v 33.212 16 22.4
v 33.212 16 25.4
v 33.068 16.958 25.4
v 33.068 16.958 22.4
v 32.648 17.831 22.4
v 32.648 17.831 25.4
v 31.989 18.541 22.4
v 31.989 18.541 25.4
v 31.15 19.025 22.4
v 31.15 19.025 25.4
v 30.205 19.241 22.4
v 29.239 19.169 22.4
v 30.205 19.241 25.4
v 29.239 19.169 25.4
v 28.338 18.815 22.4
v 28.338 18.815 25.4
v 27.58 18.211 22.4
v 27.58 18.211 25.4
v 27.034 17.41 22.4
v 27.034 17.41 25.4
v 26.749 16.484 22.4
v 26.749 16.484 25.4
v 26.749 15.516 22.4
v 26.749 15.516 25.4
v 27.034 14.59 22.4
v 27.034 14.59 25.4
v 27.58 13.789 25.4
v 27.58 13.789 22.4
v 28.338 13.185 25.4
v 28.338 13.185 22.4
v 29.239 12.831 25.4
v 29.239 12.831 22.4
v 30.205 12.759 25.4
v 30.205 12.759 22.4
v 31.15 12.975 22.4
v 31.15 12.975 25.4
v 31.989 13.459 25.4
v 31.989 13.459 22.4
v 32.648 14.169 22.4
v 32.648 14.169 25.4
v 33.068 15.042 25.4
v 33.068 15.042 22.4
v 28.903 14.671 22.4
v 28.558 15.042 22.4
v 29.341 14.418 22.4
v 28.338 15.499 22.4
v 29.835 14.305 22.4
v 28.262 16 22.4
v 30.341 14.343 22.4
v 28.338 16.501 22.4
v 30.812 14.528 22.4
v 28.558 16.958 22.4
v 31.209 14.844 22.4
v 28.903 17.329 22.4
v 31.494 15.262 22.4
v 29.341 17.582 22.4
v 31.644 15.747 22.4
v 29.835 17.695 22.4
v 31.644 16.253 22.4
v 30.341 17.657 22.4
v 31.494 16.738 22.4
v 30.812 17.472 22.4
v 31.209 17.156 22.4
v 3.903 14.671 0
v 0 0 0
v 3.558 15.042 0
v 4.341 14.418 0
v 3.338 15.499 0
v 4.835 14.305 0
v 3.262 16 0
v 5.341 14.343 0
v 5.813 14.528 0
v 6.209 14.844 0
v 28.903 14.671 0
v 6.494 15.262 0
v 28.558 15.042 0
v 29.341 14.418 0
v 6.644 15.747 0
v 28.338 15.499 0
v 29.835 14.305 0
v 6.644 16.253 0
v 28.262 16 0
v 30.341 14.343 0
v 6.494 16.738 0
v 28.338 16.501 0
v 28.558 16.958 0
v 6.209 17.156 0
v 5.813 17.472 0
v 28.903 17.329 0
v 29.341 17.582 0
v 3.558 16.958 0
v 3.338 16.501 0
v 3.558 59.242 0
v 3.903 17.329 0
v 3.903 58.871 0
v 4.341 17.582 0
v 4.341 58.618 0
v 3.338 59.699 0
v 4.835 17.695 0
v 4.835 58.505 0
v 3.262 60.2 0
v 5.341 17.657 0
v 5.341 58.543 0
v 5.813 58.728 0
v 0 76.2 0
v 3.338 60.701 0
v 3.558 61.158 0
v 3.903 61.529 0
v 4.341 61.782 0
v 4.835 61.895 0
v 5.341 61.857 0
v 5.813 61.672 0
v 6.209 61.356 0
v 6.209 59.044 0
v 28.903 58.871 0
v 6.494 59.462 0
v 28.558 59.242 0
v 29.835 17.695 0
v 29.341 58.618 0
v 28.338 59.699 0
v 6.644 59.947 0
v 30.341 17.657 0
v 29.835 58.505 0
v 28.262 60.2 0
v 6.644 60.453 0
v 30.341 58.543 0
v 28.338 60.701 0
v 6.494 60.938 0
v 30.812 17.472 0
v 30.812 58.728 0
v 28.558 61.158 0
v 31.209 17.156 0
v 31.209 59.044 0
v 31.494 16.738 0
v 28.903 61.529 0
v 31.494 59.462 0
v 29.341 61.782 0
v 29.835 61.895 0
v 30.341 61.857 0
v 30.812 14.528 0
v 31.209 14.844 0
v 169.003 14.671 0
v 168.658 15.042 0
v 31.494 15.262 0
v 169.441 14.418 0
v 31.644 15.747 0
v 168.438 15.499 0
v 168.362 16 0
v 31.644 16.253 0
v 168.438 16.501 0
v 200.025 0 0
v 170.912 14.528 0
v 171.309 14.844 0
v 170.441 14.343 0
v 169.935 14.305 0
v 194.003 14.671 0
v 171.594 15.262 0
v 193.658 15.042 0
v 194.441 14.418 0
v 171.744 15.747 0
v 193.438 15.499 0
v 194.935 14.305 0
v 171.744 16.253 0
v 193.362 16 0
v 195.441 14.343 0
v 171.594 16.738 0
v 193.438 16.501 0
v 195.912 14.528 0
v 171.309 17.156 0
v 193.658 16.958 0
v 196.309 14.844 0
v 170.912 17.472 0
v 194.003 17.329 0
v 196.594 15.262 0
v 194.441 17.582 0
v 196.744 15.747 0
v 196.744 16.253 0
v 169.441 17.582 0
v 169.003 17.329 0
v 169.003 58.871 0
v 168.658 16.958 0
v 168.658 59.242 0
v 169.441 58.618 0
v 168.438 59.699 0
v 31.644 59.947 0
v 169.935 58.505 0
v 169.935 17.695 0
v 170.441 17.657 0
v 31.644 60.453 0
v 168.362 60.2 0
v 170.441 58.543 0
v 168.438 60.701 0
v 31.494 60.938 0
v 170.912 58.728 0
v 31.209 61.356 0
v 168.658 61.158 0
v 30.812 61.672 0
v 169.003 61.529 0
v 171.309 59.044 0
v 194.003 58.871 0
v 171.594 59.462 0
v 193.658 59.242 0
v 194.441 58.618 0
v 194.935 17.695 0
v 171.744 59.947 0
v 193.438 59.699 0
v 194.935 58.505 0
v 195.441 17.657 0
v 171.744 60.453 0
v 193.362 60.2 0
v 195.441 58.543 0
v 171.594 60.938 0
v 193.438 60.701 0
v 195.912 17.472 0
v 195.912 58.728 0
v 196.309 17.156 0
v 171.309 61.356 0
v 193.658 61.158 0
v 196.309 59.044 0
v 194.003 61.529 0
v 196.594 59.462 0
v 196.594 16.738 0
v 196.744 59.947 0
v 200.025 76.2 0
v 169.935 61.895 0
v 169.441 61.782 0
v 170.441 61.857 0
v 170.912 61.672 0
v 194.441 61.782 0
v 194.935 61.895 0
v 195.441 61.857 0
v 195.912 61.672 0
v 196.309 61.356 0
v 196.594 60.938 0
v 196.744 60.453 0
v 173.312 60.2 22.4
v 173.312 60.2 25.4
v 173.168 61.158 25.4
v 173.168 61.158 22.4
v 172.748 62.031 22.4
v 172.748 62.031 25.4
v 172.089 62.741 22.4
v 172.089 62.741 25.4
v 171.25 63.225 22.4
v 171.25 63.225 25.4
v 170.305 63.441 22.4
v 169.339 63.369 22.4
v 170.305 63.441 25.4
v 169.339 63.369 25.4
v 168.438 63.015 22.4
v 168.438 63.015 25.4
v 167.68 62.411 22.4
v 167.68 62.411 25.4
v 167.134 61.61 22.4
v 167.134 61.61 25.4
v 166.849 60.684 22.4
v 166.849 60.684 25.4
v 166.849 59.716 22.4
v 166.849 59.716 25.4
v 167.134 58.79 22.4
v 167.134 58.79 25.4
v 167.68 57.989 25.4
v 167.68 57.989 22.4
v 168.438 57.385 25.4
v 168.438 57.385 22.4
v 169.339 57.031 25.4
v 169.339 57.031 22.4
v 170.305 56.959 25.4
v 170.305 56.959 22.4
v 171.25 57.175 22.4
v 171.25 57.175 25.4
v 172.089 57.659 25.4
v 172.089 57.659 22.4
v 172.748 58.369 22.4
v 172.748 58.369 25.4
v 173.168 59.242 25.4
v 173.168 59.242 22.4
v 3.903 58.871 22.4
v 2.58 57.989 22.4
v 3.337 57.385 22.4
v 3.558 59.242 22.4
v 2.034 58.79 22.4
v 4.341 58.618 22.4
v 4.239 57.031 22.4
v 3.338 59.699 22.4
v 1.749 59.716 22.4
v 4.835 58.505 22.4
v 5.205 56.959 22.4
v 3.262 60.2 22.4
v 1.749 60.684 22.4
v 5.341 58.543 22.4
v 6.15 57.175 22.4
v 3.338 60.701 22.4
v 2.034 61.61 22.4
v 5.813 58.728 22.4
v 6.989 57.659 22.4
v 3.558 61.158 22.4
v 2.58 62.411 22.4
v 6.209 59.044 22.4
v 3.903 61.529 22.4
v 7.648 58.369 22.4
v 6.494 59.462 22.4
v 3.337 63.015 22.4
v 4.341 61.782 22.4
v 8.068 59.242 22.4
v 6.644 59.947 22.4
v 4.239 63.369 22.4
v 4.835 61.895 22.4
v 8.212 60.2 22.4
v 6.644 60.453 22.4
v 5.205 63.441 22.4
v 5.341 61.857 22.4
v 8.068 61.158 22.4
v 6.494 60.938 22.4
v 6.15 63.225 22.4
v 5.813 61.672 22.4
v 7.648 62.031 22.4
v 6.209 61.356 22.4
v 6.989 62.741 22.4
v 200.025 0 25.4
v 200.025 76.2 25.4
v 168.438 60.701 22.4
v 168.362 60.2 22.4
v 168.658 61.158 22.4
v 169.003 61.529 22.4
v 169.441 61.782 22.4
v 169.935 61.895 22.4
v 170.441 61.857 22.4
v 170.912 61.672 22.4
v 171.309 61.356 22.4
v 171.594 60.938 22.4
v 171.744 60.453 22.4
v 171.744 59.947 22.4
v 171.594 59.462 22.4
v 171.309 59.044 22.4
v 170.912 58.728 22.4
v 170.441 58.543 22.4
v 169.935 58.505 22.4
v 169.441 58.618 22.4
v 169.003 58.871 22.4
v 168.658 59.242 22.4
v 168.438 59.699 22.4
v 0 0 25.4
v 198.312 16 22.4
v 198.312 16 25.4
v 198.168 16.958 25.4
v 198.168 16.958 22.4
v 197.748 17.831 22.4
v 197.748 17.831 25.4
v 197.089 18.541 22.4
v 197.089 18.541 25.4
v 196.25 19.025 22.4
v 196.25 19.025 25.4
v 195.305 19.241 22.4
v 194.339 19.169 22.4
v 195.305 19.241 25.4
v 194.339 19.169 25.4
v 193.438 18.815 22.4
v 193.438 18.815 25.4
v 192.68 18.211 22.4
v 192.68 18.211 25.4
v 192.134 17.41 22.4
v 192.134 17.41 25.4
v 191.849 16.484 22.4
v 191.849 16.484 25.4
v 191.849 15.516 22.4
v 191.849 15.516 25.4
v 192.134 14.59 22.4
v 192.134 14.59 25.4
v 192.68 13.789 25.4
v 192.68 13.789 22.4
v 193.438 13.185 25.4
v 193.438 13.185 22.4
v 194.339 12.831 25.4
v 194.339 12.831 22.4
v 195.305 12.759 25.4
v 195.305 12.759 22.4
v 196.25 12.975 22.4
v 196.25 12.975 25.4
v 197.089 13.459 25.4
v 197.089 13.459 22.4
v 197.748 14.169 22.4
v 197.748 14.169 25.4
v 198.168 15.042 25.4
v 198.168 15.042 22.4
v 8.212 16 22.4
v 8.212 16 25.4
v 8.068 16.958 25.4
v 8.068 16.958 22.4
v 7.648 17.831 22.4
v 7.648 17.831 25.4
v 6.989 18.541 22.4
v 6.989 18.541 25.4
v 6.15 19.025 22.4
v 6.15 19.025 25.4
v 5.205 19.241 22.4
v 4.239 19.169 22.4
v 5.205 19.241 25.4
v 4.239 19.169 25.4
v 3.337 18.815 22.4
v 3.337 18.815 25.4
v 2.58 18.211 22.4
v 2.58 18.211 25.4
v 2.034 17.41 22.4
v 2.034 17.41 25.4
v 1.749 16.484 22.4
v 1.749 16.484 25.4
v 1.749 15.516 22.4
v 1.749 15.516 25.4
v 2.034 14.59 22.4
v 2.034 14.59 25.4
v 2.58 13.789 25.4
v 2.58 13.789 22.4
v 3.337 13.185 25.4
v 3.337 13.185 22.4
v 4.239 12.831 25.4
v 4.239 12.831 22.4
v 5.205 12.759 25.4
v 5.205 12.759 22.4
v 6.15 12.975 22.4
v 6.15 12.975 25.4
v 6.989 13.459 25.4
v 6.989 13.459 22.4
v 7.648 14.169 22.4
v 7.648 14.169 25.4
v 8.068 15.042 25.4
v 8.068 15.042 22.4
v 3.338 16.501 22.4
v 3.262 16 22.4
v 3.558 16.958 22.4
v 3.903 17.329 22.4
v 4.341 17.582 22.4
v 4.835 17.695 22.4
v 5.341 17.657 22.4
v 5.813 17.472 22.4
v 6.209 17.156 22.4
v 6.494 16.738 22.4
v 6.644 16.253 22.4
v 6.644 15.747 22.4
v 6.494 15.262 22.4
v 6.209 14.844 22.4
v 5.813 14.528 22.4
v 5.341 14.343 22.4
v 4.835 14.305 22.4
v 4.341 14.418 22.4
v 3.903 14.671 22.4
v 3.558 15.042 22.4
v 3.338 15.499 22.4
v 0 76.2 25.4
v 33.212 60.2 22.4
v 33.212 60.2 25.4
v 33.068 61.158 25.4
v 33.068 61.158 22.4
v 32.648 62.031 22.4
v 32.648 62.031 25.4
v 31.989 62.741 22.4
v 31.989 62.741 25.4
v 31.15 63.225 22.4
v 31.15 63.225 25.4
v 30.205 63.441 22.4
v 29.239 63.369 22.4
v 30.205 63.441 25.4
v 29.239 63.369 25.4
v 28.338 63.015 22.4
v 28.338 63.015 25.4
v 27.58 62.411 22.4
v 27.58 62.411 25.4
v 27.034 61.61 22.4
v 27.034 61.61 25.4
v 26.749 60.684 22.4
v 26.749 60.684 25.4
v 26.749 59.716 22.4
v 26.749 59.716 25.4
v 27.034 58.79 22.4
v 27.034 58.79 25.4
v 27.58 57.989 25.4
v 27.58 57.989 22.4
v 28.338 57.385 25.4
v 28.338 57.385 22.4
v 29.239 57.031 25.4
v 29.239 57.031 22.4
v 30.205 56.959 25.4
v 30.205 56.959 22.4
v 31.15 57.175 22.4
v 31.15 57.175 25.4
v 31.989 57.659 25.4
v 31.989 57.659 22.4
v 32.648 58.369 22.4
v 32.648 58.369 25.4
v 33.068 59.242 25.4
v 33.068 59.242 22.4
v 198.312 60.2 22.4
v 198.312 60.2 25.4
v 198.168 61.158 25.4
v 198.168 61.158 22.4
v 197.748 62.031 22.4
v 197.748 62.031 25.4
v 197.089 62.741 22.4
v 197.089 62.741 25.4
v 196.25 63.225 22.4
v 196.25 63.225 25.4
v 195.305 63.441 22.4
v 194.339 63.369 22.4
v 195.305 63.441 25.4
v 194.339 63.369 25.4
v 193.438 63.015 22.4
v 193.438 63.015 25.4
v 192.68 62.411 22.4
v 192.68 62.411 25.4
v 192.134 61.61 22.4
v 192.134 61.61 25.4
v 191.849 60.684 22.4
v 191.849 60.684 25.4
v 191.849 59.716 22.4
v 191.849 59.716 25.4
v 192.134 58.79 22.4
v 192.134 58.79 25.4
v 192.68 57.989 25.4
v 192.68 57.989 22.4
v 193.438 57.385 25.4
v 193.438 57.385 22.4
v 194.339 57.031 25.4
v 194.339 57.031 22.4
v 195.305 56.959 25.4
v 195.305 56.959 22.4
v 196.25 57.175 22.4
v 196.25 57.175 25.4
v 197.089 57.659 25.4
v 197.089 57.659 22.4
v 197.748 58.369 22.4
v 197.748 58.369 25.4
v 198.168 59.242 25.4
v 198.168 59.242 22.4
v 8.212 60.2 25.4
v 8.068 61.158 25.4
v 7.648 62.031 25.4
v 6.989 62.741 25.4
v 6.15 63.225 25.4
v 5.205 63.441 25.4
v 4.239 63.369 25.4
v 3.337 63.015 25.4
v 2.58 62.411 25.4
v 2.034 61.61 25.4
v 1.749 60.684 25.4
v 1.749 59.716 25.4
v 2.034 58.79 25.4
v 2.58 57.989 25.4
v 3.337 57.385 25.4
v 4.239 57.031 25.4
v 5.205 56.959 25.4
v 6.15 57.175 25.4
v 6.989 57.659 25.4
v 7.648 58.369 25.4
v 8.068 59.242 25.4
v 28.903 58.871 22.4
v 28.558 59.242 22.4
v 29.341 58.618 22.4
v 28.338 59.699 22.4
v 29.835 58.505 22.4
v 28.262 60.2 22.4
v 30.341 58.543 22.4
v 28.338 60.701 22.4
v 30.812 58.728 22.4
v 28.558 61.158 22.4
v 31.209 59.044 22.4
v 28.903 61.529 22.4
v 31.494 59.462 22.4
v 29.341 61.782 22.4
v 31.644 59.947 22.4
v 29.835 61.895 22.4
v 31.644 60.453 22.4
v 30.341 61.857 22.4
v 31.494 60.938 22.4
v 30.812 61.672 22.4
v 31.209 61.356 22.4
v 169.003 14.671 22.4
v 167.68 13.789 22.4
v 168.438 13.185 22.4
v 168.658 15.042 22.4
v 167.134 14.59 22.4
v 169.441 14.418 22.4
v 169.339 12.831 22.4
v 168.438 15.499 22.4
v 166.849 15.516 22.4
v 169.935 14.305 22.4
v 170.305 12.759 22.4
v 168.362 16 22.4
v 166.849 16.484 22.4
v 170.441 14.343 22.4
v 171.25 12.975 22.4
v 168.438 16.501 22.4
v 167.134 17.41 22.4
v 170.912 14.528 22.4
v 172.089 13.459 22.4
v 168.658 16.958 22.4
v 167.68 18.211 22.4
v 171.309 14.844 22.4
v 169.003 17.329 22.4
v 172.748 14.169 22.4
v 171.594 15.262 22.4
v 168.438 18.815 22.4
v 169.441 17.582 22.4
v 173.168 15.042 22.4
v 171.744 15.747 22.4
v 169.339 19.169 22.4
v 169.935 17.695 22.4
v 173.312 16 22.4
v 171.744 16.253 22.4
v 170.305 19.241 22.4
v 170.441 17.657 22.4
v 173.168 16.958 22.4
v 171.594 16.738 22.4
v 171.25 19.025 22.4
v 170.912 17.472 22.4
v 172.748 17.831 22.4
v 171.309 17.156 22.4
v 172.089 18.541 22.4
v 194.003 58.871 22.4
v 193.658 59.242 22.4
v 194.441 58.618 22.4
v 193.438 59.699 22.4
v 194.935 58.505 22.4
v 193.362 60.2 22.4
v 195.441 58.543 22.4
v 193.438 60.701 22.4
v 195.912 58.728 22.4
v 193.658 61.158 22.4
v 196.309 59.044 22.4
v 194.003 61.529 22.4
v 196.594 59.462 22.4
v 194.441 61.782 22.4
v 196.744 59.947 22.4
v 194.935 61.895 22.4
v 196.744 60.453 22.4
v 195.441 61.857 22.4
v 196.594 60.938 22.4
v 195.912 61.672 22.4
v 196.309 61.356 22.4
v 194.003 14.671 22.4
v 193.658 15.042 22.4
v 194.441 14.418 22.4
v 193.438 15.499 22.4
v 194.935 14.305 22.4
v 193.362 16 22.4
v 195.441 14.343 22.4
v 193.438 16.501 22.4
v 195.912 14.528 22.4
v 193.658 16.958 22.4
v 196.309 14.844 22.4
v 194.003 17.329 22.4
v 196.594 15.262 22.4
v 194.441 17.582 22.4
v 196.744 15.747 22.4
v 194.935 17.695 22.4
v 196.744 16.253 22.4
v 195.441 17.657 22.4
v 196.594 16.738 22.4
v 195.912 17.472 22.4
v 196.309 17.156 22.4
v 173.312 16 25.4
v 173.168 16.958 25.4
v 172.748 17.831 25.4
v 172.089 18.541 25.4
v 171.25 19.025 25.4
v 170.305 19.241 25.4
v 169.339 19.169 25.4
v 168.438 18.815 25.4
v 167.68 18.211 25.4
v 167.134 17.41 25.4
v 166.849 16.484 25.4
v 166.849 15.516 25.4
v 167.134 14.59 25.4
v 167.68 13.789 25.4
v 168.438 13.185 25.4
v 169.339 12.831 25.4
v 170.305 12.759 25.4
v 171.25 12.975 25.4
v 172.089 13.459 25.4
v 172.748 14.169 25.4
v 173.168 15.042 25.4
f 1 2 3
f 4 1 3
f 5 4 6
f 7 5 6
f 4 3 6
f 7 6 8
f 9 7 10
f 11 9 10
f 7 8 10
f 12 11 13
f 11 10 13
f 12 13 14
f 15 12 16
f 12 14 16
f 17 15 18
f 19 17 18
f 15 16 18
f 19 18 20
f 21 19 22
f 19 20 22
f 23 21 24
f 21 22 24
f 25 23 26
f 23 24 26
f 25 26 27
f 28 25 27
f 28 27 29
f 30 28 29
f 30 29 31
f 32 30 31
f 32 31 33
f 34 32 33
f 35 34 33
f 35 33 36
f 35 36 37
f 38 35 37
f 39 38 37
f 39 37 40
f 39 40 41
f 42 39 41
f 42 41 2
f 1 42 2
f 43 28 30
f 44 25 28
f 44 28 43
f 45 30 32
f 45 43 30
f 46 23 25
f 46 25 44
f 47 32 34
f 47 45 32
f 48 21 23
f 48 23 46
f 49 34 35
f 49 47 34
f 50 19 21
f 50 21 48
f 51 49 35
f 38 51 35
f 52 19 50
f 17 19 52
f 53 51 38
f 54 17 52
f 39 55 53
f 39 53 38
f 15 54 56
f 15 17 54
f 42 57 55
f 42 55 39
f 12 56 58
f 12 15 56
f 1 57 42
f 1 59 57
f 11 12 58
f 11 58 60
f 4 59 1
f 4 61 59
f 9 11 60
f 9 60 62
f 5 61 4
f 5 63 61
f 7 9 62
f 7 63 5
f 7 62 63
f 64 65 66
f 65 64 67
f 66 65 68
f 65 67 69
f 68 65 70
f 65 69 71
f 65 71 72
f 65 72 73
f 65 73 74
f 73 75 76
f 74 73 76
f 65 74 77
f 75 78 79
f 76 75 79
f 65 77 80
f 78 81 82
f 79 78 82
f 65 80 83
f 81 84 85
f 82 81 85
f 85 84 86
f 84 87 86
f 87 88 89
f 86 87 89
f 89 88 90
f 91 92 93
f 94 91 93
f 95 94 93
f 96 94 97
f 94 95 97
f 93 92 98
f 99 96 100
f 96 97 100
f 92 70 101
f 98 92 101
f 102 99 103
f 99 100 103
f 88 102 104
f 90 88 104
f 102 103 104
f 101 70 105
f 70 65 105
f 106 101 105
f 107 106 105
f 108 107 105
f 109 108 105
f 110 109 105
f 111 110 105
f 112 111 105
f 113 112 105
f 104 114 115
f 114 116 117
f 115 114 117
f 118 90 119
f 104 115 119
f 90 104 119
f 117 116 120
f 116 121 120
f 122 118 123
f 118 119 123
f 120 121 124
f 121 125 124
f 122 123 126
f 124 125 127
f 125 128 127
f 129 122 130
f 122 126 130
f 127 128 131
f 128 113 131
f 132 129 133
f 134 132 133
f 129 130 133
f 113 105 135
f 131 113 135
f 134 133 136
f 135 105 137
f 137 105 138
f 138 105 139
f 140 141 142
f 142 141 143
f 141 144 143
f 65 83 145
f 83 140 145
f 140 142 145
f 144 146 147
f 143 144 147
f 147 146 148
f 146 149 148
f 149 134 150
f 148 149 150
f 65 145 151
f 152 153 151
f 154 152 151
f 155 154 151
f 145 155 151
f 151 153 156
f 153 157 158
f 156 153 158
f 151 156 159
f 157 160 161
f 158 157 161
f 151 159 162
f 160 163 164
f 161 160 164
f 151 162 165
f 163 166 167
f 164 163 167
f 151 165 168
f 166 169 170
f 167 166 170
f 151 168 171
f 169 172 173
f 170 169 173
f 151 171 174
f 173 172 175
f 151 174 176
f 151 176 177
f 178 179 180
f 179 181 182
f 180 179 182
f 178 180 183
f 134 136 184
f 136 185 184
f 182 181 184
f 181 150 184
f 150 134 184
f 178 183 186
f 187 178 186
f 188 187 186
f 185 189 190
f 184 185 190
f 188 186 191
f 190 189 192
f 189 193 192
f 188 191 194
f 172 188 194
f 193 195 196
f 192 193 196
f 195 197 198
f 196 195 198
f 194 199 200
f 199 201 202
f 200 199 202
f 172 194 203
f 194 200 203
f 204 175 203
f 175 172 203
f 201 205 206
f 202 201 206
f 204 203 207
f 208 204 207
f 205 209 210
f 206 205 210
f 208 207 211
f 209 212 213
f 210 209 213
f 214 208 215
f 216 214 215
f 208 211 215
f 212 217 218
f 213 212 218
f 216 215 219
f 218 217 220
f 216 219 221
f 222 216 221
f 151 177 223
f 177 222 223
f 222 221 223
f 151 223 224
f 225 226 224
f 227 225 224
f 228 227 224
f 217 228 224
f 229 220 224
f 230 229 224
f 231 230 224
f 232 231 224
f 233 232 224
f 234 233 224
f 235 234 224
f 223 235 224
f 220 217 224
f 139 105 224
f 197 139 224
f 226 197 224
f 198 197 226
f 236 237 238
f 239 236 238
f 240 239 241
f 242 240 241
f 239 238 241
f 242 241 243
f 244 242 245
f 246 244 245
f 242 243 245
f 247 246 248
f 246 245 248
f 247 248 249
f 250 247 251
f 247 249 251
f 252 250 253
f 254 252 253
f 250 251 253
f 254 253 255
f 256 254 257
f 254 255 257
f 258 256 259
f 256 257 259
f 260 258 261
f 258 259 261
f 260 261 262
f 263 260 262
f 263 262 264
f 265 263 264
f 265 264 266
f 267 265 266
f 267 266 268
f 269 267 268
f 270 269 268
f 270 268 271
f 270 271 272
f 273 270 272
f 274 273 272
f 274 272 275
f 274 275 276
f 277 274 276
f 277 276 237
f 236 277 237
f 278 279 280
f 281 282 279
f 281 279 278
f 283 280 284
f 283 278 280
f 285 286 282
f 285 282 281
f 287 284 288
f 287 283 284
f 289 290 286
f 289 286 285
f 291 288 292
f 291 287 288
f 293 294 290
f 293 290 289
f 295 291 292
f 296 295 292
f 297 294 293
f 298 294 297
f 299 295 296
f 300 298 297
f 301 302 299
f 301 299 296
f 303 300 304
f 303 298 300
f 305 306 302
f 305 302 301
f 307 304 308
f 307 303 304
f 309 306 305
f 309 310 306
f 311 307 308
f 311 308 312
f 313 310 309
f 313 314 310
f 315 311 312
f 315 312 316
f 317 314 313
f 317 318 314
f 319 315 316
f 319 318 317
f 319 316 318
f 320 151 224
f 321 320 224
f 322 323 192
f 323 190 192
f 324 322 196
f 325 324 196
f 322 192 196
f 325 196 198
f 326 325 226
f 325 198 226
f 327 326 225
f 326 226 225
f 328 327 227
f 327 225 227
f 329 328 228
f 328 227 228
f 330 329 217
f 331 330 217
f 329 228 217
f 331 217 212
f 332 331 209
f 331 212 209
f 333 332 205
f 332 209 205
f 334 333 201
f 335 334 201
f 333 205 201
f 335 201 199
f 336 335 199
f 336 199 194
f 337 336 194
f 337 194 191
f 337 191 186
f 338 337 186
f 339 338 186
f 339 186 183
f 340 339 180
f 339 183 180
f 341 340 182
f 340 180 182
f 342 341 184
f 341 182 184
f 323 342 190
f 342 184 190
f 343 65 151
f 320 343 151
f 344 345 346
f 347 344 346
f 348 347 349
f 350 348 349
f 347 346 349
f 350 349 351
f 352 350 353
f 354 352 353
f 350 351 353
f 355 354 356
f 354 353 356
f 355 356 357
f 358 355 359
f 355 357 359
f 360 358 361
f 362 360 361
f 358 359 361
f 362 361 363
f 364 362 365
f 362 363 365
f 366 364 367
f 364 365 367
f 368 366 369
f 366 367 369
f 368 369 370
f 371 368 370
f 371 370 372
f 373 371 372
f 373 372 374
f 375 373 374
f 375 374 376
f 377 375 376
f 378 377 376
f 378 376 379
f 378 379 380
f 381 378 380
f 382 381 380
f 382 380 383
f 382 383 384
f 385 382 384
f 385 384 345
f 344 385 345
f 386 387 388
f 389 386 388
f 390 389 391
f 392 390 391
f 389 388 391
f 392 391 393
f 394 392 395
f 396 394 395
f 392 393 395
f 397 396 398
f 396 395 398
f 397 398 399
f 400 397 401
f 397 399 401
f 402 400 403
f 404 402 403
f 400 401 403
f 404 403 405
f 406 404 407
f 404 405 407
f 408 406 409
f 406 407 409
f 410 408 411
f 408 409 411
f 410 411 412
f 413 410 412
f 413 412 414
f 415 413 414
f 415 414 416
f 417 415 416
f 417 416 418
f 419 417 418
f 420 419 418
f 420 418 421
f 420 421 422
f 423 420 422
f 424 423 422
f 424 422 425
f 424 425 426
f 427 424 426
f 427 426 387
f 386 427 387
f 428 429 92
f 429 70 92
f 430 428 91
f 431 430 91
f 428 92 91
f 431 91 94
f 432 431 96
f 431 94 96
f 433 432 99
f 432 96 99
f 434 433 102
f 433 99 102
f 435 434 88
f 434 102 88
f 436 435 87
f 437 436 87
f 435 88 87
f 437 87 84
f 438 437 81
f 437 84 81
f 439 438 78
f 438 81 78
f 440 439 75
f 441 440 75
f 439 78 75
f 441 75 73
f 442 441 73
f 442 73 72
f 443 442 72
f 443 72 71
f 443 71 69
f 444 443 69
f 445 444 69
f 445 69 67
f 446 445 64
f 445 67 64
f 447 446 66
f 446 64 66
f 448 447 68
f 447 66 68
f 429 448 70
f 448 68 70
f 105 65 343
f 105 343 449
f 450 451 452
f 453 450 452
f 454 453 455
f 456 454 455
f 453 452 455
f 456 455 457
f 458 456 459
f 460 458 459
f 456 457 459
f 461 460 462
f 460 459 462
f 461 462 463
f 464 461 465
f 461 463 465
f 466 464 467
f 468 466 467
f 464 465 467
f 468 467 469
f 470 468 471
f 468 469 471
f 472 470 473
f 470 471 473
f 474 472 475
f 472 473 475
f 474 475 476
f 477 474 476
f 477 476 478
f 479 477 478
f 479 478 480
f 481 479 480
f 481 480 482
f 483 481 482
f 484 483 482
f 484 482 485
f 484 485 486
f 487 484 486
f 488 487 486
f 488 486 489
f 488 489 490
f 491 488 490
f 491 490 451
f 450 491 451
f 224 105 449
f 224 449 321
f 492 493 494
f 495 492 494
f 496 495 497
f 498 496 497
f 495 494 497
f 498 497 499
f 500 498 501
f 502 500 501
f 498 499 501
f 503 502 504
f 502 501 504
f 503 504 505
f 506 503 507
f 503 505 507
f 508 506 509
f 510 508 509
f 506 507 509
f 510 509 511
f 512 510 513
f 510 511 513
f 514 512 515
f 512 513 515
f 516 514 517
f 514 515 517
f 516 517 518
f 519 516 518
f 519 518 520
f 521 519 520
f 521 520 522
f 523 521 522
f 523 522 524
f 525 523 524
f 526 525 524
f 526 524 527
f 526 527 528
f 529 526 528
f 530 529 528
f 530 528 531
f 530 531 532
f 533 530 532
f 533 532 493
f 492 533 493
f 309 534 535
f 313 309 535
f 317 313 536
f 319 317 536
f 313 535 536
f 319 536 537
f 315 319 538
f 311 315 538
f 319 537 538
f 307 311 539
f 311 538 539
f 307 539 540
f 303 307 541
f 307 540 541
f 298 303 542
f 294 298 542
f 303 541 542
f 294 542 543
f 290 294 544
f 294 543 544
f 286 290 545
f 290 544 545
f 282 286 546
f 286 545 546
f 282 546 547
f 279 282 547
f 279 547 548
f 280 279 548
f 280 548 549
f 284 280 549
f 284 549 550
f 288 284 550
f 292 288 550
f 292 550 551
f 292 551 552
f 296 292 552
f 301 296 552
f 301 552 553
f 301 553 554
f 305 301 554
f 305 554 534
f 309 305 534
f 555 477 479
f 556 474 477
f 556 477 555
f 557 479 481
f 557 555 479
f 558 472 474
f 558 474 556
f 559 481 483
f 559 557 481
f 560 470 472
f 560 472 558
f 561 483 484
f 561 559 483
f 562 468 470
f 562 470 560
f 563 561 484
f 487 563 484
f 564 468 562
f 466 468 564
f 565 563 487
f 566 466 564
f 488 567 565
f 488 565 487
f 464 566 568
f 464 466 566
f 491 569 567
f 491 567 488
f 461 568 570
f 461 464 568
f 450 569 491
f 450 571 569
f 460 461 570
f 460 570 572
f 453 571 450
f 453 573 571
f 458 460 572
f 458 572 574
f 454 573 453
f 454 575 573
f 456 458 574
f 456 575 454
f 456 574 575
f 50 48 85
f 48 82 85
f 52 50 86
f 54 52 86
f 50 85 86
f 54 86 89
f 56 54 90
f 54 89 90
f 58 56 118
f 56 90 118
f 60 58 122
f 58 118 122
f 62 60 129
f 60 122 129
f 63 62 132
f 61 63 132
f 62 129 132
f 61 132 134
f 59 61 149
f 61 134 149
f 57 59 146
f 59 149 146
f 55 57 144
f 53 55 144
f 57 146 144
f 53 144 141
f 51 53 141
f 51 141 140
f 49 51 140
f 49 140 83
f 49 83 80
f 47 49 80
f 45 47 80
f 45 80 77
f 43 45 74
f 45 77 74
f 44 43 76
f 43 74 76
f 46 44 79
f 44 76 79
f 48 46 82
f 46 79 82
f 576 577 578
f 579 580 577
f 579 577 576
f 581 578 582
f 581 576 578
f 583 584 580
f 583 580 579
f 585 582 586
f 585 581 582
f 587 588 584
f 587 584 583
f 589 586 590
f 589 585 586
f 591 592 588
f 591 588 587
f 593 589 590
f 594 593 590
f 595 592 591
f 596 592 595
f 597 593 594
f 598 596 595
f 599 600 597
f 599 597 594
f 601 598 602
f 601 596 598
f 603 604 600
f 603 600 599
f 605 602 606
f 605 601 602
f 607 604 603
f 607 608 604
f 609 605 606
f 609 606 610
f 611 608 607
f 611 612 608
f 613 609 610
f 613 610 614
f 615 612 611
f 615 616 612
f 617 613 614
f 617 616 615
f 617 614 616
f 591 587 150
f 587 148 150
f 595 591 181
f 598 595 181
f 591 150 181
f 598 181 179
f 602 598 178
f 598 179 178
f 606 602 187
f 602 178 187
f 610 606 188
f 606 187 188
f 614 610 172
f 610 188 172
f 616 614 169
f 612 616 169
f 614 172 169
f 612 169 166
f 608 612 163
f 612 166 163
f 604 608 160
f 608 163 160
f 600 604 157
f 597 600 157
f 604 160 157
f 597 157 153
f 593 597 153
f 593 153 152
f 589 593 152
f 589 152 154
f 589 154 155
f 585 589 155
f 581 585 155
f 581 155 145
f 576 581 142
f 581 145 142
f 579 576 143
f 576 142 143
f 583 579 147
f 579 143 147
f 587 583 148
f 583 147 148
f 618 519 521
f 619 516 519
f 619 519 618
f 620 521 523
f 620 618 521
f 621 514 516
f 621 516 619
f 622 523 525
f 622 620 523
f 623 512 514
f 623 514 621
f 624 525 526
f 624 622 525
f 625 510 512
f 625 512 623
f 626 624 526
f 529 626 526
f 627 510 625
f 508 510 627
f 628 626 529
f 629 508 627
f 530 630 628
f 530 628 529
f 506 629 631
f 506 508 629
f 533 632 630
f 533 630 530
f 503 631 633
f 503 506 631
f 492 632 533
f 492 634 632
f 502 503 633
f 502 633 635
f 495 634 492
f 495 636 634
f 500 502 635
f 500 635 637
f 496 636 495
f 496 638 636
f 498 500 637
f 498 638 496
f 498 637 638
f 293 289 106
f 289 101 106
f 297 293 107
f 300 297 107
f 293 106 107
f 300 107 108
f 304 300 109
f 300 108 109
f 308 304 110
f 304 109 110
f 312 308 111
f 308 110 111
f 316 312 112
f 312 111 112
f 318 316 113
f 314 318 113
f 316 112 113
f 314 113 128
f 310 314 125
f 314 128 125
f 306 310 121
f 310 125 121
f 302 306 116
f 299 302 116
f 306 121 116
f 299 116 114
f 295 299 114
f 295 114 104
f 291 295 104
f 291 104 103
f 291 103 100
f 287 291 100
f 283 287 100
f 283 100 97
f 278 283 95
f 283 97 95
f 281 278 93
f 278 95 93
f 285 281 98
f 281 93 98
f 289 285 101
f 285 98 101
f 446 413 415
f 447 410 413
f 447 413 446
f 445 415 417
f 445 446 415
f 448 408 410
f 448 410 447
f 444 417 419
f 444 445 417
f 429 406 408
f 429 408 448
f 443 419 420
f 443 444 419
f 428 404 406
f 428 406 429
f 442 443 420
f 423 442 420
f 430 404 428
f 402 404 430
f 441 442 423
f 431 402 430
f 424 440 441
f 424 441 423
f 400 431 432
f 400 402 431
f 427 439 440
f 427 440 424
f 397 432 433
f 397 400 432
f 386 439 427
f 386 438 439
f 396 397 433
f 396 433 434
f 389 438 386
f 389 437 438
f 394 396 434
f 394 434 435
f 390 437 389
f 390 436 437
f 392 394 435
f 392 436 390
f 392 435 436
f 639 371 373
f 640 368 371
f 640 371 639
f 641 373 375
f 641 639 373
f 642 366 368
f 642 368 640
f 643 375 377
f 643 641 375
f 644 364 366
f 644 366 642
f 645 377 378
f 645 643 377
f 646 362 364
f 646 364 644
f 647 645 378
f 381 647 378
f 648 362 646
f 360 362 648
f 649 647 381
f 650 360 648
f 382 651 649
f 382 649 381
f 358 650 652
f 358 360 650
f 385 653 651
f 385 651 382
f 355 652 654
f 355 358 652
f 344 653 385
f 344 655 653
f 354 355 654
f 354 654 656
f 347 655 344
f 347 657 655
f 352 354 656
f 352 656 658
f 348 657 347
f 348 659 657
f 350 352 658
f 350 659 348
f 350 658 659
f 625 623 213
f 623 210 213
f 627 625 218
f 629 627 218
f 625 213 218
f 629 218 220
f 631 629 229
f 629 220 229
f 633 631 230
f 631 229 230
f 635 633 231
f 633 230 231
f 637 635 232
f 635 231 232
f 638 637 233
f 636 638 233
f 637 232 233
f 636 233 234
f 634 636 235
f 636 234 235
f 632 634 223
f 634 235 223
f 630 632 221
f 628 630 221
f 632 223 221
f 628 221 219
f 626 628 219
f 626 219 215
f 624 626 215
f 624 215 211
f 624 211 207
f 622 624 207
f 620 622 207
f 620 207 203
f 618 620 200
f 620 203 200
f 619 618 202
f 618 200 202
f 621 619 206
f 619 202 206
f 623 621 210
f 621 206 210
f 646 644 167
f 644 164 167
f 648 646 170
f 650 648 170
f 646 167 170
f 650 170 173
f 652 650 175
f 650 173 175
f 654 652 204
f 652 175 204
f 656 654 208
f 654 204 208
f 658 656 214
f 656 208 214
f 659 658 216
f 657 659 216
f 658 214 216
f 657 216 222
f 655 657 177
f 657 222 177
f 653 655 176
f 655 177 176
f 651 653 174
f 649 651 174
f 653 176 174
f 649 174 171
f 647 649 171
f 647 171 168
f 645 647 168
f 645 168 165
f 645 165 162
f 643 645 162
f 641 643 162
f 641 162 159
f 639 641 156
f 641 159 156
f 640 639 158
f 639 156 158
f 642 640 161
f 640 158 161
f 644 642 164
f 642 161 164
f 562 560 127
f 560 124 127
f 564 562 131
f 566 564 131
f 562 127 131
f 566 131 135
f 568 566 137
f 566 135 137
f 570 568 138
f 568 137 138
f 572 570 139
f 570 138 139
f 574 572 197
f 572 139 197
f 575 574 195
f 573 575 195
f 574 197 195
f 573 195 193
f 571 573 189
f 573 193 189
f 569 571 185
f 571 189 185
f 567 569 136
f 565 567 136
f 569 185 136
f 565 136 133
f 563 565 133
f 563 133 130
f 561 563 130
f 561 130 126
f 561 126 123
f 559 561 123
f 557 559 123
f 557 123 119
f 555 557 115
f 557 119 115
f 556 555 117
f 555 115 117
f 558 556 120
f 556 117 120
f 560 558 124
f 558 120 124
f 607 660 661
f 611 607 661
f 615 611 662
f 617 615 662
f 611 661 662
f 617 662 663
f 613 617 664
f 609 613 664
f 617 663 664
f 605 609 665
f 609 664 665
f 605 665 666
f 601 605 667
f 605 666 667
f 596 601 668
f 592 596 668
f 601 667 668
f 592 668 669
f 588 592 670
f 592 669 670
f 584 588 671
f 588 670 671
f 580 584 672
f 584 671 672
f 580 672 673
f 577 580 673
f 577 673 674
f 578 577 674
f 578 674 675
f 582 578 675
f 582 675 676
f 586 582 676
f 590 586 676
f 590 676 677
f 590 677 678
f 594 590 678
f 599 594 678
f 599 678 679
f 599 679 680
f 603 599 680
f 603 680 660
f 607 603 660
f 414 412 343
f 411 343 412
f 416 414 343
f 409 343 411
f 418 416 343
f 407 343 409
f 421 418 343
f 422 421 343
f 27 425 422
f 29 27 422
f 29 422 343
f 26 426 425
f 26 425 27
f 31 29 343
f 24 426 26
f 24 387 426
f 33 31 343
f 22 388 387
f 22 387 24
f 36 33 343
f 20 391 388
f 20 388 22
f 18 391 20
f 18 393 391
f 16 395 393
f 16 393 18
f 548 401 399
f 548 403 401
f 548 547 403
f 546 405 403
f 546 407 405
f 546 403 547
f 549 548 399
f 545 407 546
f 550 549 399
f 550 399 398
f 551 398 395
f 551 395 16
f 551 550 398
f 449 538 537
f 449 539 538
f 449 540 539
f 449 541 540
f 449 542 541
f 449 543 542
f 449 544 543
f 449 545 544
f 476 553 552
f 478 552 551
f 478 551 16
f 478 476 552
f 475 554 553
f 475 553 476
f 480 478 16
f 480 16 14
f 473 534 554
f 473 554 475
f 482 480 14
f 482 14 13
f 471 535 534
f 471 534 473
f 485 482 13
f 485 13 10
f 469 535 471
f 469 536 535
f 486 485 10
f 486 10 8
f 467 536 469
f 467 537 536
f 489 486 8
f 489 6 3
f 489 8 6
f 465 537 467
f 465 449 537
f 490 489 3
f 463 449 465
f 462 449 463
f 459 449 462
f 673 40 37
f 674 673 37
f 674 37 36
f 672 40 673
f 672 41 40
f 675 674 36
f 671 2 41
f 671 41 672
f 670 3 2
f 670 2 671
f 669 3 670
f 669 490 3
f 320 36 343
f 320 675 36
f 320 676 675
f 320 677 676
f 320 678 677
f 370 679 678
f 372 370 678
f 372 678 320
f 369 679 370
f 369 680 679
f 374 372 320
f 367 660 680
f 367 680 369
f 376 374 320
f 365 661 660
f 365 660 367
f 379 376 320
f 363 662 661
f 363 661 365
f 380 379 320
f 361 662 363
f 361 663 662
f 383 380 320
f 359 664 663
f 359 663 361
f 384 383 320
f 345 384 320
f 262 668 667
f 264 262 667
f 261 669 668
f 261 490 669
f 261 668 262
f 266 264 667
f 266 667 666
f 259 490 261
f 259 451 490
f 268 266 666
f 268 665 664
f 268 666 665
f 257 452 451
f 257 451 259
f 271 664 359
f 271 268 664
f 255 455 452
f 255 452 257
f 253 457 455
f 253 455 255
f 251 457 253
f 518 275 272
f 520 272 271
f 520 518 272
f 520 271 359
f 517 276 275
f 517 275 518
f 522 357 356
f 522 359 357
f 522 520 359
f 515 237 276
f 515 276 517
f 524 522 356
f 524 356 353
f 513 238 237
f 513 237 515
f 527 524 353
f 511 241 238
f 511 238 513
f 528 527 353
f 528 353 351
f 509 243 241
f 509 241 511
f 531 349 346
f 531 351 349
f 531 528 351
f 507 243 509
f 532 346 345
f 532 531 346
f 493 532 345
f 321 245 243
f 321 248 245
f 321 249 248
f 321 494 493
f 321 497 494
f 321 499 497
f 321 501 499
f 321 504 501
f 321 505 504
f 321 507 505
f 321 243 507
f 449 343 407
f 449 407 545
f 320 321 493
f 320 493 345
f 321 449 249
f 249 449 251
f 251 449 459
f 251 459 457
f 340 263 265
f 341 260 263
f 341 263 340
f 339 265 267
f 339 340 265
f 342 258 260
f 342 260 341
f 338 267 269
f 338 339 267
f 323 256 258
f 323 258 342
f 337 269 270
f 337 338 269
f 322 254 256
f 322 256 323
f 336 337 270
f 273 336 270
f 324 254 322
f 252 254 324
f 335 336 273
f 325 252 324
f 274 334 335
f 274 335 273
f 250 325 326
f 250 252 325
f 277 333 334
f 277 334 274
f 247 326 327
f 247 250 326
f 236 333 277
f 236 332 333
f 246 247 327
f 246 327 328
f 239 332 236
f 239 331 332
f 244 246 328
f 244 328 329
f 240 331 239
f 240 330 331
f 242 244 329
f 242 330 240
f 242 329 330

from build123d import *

# Parameters (mm, degrees)
F0_W           = 200.025
F0_H           = 76.2
F1_DEPTH       = 25.4
F3_D           = 3.4
F3_CBORE_D     = 6.5
F3_CBORE_DEPTH = 3


with BuildPart() as f1:
    # F0 (on Top) → F1 (new body)
    with BuildSketch(Plane.XY):
        with Locations((100.0125, 38.1)):
            Rectangle(F0_W, F0_H)
    extrude(amount=F1_DEPTH)

    # F3 (through all)
    with Locations(Plane.XY.offset(25.4)):
        with Locations((4.9625, 60.2), (29.9625, 60.2), (4.9625, 16), (29.9625, 16), (170.0625, 60.2), (195.0625, 60.2), (170.0625, 16), (195.0625, 16)):
            CounterBoreHole(F3_D / 2, F3_CBORE_D / 2, F3_CBORE_DEPTH)


solid = f1.part
